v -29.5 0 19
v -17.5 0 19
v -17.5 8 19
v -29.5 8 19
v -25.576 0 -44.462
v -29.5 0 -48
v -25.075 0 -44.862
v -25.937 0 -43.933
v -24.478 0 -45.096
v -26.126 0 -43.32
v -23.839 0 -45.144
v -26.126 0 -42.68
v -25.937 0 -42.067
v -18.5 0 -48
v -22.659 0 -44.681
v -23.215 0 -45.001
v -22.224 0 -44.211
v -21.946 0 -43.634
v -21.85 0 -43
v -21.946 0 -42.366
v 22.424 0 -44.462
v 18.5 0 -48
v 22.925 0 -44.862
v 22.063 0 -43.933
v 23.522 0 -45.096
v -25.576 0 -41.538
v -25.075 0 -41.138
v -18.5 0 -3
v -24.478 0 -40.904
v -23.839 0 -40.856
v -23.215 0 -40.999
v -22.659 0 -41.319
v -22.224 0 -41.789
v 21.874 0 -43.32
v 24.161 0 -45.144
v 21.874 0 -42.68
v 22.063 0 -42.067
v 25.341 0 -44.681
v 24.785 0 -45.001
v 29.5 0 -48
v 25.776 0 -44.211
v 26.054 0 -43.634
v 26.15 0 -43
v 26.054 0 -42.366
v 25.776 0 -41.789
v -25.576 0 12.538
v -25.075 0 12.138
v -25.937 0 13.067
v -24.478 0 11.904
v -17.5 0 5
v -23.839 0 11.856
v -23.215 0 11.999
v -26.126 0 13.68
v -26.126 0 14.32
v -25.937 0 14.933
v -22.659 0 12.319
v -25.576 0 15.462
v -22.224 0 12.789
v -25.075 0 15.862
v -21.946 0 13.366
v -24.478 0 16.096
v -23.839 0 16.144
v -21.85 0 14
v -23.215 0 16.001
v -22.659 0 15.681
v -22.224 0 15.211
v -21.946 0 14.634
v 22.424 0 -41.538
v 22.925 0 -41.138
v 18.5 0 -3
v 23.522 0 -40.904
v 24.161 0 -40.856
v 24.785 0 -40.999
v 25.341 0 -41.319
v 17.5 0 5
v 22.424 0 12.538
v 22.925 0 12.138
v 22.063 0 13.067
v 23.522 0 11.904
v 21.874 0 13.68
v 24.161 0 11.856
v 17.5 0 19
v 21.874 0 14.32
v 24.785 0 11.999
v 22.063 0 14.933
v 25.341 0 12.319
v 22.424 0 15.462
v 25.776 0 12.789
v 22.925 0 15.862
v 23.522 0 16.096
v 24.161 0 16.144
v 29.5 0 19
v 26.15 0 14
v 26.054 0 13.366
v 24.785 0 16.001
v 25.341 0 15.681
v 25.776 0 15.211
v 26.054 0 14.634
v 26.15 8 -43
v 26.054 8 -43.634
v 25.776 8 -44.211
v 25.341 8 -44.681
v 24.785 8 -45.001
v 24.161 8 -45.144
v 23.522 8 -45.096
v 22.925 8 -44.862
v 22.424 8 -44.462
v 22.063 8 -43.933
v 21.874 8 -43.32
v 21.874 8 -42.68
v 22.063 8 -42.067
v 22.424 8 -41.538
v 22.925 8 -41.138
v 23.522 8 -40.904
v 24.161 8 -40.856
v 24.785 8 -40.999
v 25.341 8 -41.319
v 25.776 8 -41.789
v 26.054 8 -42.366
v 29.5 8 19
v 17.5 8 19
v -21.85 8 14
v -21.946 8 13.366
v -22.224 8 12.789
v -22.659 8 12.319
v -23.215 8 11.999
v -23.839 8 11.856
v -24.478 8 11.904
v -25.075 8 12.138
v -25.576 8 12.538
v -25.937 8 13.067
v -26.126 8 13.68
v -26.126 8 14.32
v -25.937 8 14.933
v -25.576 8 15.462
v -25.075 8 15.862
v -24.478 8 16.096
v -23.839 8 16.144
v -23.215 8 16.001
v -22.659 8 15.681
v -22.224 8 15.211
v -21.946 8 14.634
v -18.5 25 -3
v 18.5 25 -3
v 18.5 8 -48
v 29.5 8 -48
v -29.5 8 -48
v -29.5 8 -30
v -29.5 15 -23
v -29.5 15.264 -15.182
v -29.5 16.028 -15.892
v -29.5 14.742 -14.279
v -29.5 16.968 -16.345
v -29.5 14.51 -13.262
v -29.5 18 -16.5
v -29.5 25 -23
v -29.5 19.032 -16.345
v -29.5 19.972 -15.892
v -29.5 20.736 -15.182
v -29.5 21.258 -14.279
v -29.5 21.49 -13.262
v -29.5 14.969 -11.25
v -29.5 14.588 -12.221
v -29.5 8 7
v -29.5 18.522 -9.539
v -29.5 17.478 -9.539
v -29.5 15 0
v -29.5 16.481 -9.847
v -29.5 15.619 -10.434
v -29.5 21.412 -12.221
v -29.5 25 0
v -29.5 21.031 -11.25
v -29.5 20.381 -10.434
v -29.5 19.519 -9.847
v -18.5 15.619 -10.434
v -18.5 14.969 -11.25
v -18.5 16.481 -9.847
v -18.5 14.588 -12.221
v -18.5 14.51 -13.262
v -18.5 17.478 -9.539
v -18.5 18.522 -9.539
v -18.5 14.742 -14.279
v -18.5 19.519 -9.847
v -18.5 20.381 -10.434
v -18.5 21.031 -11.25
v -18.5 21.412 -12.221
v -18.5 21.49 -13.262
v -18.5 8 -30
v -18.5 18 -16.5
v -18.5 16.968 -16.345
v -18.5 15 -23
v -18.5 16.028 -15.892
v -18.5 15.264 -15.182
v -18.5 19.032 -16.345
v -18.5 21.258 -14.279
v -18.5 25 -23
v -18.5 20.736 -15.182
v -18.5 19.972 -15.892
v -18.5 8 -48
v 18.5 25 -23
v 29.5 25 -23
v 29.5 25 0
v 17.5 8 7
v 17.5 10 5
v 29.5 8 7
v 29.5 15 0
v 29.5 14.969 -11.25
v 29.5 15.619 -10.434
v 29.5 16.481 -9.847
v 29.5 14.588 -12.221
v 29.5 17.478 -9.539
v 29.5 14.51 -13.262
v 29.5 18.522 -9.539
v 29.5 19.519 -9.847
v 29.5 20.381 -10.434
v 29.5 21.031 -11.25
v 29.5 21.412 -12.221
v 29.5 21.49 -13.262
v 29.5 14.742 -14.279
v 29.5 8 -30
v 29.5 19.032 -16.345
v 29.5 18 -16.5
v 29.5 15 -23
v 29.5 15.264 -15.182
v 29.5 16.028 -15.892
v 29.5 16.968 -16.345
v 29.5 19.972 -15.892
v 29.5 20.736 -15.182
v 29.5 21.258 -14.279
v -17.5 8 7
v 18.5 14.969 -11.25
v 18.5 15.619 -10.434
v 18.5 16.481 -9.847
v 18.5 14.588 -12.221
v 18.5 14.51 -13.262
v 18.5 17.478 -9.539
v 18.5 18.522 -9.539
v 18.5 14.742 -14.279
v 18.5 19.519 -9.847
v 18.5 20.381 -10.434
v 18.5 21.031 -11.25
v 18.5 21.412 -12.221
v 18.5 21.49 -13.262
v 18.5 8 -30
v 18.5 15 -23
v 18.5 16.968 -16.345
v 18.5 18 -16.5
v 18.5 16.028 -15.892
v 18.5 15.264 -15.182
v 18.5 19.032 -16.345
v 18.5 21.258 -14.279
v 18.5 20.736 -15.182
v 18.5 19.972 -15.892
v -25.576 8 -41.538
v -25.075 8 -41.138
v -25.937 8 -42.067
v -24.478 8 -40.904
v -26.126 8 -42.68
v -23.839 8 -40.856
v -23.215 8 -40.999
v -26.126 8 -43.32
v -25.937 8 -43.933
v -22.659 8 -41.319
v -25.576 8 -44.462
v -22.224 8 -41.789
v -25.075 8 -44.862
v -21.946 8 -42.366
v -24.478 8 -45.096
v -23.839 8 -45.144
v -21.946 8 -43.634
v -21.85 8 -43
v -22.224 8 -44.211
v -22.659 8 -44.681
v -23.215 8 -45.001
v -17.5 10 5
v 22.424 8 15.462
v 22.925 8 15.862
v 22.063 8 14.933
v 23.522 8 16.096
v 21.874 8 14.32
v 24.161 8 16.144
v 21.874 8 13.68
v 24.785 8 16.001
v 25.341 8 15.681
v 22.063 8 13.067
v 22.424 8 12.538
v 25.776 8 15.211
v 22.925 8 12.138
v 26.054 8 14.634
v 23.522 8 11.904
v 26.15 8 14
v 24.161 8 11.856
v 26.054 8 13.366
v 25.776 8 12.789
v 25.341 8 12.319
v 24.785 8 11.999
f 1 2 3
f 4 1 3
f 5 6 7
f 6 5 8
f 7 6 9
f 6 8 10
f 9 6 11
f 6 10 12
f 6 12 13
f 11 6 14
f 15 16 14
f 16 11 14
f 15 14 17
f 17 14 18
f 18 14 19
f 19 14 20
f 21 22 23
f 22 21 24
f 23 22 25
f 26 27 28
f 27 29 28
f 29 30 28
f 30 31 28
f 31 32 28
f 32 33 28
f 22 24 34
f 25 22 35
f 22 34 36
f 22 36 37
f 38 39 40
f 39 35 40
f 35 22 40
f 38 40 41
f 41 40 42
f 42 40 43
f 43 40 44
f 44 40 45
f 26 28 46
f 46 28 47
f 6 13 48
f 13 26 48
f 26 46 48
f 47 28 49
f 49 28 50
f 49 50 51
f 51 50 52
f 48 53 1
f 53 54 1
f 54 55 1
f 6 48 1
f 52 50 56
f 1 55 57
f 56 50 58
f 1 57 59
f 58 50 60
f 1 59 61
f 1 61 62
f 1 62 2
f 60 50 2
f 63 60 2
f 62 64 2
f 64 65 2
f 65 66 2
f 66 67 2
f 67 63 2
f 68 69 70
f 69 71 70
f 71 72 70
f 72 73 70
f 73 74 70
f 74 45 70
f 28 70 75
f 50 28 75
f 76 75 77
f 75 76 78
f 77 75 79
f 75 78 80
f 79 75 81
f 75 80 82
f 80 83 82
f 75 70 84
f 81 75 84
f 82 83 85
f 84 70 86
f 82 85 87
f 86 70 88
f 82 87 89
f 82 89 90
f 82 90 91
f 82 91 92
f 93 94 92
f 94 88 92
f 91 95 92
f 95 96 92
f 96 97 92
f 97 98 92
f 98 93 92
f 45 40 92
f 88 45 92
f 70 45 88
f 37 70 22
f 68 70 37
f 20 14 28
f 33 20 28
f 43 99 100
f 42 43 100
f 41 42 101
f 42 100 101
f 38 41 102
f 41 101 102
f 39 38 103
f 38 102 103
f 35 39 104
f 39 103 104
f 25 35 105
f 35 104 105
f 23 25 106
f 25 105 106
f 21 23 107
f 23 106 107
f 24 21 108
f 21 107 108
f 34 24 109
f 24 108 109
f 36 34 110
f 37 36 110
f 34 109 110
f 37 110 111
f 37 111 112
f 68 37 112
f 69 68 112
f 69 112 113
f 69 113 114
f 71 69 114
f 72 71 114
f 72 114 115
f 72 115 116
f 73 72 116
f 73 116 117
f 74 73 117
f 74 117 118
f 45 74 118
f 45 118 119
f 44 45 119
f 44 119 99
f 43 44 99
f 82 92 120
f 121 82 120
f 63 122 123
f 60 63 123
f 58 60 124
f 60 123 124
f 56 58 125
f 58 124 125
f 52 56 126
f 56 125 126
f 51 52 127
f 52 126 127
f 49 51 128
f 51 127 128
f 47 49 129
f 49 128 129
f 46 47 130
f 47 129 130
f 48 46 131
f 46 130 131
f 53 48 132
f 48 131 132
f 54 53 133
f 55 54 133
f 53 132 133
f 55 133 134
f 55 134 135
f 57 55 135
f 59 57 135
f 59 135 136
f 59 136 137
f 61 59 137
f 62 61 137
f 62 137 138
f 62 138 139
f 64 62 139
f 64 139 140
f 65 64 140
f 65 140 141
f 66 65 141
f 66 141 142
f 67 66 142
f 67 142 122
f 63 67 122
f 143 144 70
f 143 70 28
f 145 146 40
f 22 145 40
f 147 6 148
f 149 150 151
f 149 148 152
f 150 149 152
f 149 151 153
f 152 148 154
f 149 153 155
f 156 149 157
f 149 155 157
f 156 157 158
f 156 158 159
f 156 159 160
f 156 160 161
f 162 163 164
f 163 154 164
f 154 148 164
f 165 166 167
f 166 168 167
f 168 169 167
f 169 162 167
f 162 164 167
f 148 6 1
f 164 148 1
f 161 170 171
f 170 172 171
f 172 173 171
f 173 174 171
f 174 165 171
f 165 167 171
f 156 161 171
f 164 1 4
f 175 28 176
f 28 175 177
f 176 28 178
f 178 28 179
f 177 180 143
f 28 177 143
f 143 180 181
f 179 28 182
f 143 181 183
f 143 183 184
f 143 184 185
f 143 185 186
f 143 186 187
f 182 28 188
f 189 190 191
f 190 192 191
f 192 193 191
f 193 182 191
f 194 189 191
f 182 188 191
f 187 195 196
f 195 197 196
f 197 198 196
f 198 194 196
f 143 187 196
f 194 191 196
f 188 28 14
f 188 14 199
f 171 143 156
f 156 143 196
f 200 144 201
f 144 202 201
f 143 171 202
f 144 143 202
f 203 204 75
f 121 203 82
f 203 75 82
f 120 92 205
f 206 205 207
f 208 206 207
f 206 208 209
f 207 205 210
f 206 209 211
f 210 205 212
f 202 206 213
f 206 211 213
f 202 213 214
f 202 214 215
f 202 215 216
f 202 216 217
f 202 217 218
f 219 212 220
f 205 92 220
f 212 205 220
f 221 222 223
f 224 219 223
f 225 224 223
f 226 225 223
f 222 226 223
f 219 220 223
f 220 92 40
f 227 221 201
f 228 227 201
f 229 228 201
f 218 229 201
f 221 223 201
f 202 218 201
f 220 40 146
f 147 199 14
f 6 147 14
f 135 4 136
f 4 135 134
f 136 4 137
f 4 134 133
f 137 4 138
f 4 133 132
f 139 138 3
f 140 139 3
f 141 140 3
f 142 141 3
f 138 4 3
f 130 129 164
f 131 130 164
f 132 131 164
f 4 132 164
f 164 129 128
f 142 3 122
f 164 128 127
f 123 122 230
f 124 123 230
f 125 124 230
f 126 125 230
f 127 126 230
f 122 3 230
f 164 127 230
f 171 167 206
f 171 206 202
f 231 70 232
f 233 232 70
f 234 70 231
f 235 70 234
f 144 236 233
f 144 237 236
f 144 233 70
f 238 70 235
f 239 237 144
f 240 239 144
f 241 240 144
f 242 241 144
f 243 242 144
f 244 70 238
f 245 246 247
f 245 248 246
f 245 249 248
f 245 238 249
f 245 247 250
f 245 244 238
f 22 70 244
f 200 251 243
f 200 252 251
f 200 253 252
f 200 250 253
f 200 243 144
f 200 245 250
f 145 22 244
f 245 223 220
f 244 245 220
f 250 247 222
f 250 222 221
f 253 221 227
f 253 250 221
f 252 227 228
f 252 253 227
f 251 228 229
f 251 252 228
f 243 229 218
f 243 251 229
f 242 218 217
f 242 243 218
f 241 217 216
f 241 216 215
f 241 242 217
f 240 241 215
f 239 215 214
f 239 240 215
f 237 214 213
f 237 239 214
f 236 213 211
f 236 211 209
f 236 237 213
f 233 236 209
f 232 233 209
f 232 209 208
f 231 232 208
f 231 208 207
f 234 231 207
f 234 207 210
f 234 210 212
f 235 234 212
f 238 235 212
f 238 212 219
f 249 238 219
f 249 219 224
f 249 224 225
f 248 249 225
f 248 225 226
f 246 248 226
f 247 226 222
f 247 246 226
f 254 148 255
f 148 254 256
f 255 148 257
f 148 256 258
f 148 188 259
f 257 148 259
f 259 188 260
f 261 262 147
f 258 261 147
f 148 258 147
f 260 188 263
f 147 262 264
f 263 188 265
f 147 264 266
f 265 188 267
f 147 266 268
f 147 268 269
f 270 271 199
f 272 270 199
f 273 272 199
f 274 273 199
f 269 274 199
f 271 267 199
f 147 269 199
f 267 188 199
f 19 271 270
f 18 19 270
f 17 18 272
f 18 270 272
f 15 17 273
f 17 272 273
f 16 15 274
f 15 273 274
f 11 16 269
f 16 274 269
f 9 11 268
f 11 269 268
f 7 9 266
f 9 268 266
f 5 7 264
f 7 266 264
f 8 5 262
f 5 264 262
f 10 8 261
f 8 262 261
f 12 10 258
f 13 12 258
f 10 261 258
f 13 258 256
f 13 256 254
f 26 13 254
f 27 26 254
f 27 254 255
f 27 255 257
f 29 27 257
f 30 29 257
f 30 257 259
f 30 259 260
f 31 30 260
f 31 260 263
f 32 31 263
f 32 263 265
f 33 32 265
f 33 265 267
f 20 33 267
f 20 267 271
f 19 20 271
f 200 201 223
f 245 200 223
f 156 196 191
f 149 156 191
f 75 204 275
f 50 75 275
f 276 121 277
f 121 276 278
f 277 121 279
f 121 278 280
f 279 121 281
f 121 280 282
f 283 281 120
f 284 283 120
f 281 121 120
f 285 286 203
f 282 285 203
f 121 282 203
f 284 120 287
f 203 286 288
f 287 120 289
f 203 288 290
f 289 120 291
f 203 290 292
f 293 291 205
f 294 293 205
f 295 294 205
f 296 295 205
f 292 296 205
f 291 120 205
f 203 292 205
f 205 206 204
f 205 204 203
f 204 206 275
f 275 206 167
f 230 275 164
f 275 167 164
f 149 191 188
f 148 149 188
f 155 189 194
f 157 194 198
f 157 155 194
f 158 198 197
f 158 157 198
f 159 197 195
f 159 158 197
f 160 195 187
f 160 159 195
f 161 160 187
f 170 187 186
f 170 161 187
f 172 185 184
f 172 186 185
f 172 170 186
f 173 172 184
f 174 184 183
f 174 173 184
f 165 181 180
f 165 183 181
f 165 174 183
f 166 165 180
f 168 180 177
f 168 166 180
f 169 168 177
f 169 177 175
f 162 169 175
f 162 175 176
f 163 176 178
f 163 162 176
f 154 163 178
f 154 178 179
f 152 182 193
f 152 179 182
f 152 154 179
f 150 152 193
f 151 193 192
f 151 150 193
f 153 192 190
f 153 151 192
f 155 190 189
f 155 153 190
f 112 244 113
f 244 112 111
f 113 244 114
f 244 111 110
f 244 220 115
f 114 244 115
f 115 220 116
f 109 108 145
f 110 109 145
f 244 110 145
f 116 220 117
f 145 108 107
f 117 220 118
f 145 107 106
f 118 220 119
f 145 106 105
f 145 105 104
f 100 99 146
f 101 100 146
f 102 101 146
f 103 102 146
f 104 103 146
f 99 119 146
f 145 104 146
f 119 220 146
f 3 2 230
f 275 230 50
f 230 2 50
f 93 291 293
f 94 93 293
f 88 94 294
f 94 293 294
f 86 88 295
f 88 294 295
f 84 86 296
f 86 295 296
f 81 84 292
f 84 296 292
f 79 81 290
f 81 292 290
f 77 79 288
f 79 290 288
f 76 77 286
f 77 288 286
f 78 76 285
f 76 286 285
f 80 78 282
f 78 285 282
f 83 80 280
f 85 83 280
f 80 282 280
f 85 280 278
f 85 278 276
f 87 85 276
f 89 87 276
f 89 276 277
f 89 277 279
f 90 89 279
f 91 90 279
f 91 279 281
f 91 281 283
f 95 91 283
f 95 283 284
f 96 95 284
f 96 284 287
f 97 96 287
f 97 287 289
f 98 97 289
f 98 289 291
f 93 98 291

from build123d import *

# Parameters (mm, degrees)
SKETCH_1_R          = 3.5
EXTRUDE_1_DEPTH     = 29.5
SKETCH_3_W          = 37
SKETCH_3_H          = 17
CUT_EXTRUDE_2_DEPTH = 20
CUT_EXTRUDE_3_REACH = 60.849
SKETCH_4_W          = 37
SKETCH_4_H          = 45
SKETCH_4_W_2        = 35
SKETCH_4_H_2        = 14
HOLE_WIZARD_M4_1_D  = 4.3
CHAMFER_1_SIZE      = 7


with BuildPart() as part:
    # 草图1 → 凸台-拉伸1 (new, symmetric)
    with BuildSketch(Plane(origin=(0, 0, 0), x_dir=(0, 0, -1), z_dir=(1, 0, 0))):
        Polygon((0, 8), (0, 25), (23, 25), (23, 8), (48, 8), (48, 0), (-19, 0), (-19, 8), align=None)
        with Locations((13, 18)):
            Circle(SKETCH_1_R, mode=Mode.SUBTRACT)
    extrude(amount=EXTRUDE_1_DEPTH, both=True)

    # 草图3 → 切除-拉伸2 (cut)
    with BuildSketch(Plane(origin=(0, 0, -23), x_dir=(-1, 0, 0), z_dir=(0, 0, -1))):
        with Locations((0, 16.5)):
            Rectangle(SKETCH_3_W, SKETCH_3_H)
    extrude(amount=-CUT_EXTRUDE_2_DEPTH, mode=Mode.SUBTRACT)

    # 草图4 → 切除-拉伸3 (cut, up to next)
    with BuildSketch(Plane(origin=(0, 8, 0), x_dir=(1, 0, 0), z_dir=(0, 1, 0)), mode=Mode.PRIVATE) as cut_extrude_3_sk1:
        with Locations((0, 25.5)):
            Rectangle(SKETCH_4_W, SKETCH_4_H)
    cut_extrude_3_tool1 = extrude(cut_extrude_3_sk1.sketch, amount=-CUT_EXTRUDE_3_REACH, mode=Mode.PRIVATE) & part.part
    # 草图4 → 切除-拉伸3 (cut, up to next)
    with BuildSketch(Plane(origin=(0, 8, 0), x_dir=(1, 0, 0), z_dir=(0, 1, 0)), mode=Mode.PRIVATE) as cut_extrude_3_sk2:
        with Locations((0, -12)):
            Rectangle(SKETCH_4_W_2, SKETCH_4_H_2)
    cut_extrude_3_tool2 = extrude(cut_extrude_3_sk2.sketch, amount=-CUT_EXTRUDE_3_REACH, mode=Mode.PRIVATE) & part.part
    add(cut_extrude_3_tool1.solids().sort_by_distance((0, 8, -25.5))[0], mode=Mode.SUBTRACT)
    add(cut_extrude_3_tool2.solids().sort_by_distance((0, 8, 12))[0], mode=Mode.SUBTRACT)

    # M4 间隙孔1 (through all)
    with Locations(Plane(origin=(0, 0, 0), x_dir=(-1, 0, 0), z_dir=(0, -1, 0))):
        with Locations((24, -14), (24, 43), (-24, -14), (-24, 43)):
            Hole(HOLE_WIZARD_M4_1_D / 2)

    # 倒角1
    # the kernel refuses this chamfer: 7 mm, written as the material it adds along each edge
    with BuildSketch(Plane(origin=(-29.5, 8, 0), x_dir=(0, 0.9996219169112968, -0.027495876610586365), z_dir=(1, 0, 0))) as chamfer_1_piece_1_section:
        Polygon((CHAMFER_1_SIZE * 0.999621916911, CHAMFER_1_SIZE * 0.0274958766106), (-CHAMFER_1_SIZE * 0.0274958766106, CHAMFER_1_SIZE * 0.999621916911), (0, 0), align=None)
    chamfer_1_piece_1 = extrude(amount=59, mode=Mode.PRIVATE)
    chamfer_1_piece_1 = split(chamfer_1_piece_1, bisect_by=Plane(origin=(-17.5, 10.498239804, 1.946316209), z_dir=(-1, 0, 0)), keep=Keep.TOP, mode=Mode.PRIVATE)
    chamfer_1_piece_1 = split(chamfer_1_piece_1, bisect_by=Plane(origin=(-23.5, 10.498239804, 5), z_dir=(0, 0, -1)), keep=Keep.TOP, mode=Mode.PRIVATE)
    add(chamfer_1_piece_1)
    with BuildSketch(Plane(origin=(-29.5, 8, 0), x_dir=(0, 0.9996219169112968, -0.027495876610586365), z_dir=(1, 0, 0))) as chamfer_1_piece_2_section:
        Polygon((CHAMFER_1_SIZE * 0.999621916911, CHAMFER_1_SIZE * 0.0274958766106), (-CHAMFER_1_SIZE * 0.0274958766106, CHAMFER_1_SIZE * 0.999621916911), (0, 0), align=None)
    chamfer_1_piece_2 = extrude(amount=59, mode=Mode.PRIVATE)
    chamfer_1_piece_2 = split(chamfer_1_piece_2, bisect_by=Plane(origin=(-17.5, 8.493423537, 5.774901665), z_dir=(-1, 0, 0)), keep=Keep.TOP, mode=Mode.PRIVATE)
    chamfer_1_piece_2 = split(chamfer_1_piece_2, bisect_by=Plane(origin=(-23.5, 8.493423537, 5), z_dir=(0, 0, 1)), keep=Keep.TOP, mode=Mode.PRIVATE)
    add(chamfer_1_piece_2)
    with BuildSketch(Plane(origin=(-29.5, 8, 0), x_dir=(0, 0.9996219169112968, -0.027495876610586365), z_dir=(1, 0, 0))) as chamfer_1_piece_3_section:
        Polygon((CHAMFER_1_SIZE * 0.999621916911, CHAMFER_1_SIZE * 0.0274958766106), (-CHAMFER_1_SIZE * 0.0274958766106, CHAMFER_1_SIZE * 0.999621916911), (0, 0), align=None)
    chamfer_1_piece_3 = extrude(amount=59, mode=Mode.PRIVATE)
    chamfer_1_piece_3 = split(chamfer_1_piece_3, bisect_by=Plane(origin=(-17.5, 10.498239804, 1.946316209), z_dir=(1, 0, 0)), keep=Keep.TOP, mode=Mode.PRIVATE)
    chamfer_1_piece_3 = split(chamfer_1_piece_3, bisect_by=Plane(origin=(0, 10.498239804, 5), z_dir=(0, 0, -1)), keep=Keep.TOP, mode=Mode.PRIVATE)
    chamfer_1_piece_3 = split(chamfer_1_piece_3, bisect_by=Plane(origin=(17.5, 10.498239804, 1.946316209), z_dir=(-1, 0, 0)), keep=Keep.TOP, mode=Mode.PRIVATE)
    add(chamfer_1_piece_3)
    with BuildSketch(Plane(origin=(-29.5, 8, 0), x_dir=(0, 0.9996219169112968, -0.027495876610586365), z_dir=(1, 0, 0))) as chamfer_1_piece_4_section:
        Polygon((CHAMFER_1_SIZE * 0.999621916911, CHAMFER_1_SIZE * 0.0274958766106), (-CHAMFER_1_SIZE * 0.0274958766106, CHAMFER_1_SIZE * 0.999621916911), (0, 0), align=None)
    chamfer_1_piece_4 = extrude(amount=59, mode=Mode.PRIVATE)
    chamfer_1_piece_4 = split(chamfer_1_piece_4, bisect_by=Plane(origin=(23.5, 10.498239804, 5), z_dir=(0, 0, -1)), keep=Keep.TOP, mode=Mode.PRIVATE)
    chamfer_1_piece_4 = split(chamfer_1_piece_4, bisect_by=Plane(origin=(17.5, 10.498239804, 1.946316209), z_dir=(1, 0, 0)), keep=Keep.TOP, mode=Mode.PRIVATE)
    add(chamfer_1_piece_4)
    with BuildSketch(Plane(origin=(-29.5, 8, 0), x_dir=(0, 0.9996219169112968, -0.027495876610586365), z_dir=(1, 0, 0))) as chamfer_1_piece_5_section:
        Polygon((CHAMFER_1_SIZE * 0.999621916911, CHAMFER_1_SIZE * 0.0274958766106), (-CHAMFER_1_SIZE * 0.0274958766106, CHAMFER_1_SIZE * 0.999621916911), (0, 0), align=None)
    chamfer_1_piece_5 = extrude(amount=59, mode=Mode.PRIVATE)
    chamfer_1_piece_5 = split(chamfer_1_piece_5, bisect_by=Plane(origin=(23.5, 8.493423537, 5), z_dir=(0, 0, 1)), keep=Keep.TOP, mode=Mode.PRIVATE)
    chamfer_1_piece_5 = split(chamfer_1_piece_5, bisect_by=Plane(origin=(17.5, 8.493423537, 5.774901665), z_dir=(1, 0, 0)), keep=Keep.TOP, mode=Mode.PRIVATE)
    add(chamfer_1_piece_5)
    with BuildSketch(Plane(origin=(29.5, 8, -23), x_dir=(0, 0.9996219169112968, 0.02749587661058661), z_dir=(-1, 0, 0)), Plane(origin=(-18.5, 8, -23), x_dir=(0, 0.9996219169112968, 0.02749587661058661), z_dir=(-1, 0, 0))) as chamfer_1_piece_6:
        Polygon((CHAMFER_1_SIZE * 0.999621916911, CHAMFER_1_SIZE * 0.0274958766106), (-CHAMFER_1_SIZE * 0.0274958766106, CHAMFER_1_SIZE * 0.999621916911), (0, 0), align=None)
    extrude(amount=11)


solid = part.part
